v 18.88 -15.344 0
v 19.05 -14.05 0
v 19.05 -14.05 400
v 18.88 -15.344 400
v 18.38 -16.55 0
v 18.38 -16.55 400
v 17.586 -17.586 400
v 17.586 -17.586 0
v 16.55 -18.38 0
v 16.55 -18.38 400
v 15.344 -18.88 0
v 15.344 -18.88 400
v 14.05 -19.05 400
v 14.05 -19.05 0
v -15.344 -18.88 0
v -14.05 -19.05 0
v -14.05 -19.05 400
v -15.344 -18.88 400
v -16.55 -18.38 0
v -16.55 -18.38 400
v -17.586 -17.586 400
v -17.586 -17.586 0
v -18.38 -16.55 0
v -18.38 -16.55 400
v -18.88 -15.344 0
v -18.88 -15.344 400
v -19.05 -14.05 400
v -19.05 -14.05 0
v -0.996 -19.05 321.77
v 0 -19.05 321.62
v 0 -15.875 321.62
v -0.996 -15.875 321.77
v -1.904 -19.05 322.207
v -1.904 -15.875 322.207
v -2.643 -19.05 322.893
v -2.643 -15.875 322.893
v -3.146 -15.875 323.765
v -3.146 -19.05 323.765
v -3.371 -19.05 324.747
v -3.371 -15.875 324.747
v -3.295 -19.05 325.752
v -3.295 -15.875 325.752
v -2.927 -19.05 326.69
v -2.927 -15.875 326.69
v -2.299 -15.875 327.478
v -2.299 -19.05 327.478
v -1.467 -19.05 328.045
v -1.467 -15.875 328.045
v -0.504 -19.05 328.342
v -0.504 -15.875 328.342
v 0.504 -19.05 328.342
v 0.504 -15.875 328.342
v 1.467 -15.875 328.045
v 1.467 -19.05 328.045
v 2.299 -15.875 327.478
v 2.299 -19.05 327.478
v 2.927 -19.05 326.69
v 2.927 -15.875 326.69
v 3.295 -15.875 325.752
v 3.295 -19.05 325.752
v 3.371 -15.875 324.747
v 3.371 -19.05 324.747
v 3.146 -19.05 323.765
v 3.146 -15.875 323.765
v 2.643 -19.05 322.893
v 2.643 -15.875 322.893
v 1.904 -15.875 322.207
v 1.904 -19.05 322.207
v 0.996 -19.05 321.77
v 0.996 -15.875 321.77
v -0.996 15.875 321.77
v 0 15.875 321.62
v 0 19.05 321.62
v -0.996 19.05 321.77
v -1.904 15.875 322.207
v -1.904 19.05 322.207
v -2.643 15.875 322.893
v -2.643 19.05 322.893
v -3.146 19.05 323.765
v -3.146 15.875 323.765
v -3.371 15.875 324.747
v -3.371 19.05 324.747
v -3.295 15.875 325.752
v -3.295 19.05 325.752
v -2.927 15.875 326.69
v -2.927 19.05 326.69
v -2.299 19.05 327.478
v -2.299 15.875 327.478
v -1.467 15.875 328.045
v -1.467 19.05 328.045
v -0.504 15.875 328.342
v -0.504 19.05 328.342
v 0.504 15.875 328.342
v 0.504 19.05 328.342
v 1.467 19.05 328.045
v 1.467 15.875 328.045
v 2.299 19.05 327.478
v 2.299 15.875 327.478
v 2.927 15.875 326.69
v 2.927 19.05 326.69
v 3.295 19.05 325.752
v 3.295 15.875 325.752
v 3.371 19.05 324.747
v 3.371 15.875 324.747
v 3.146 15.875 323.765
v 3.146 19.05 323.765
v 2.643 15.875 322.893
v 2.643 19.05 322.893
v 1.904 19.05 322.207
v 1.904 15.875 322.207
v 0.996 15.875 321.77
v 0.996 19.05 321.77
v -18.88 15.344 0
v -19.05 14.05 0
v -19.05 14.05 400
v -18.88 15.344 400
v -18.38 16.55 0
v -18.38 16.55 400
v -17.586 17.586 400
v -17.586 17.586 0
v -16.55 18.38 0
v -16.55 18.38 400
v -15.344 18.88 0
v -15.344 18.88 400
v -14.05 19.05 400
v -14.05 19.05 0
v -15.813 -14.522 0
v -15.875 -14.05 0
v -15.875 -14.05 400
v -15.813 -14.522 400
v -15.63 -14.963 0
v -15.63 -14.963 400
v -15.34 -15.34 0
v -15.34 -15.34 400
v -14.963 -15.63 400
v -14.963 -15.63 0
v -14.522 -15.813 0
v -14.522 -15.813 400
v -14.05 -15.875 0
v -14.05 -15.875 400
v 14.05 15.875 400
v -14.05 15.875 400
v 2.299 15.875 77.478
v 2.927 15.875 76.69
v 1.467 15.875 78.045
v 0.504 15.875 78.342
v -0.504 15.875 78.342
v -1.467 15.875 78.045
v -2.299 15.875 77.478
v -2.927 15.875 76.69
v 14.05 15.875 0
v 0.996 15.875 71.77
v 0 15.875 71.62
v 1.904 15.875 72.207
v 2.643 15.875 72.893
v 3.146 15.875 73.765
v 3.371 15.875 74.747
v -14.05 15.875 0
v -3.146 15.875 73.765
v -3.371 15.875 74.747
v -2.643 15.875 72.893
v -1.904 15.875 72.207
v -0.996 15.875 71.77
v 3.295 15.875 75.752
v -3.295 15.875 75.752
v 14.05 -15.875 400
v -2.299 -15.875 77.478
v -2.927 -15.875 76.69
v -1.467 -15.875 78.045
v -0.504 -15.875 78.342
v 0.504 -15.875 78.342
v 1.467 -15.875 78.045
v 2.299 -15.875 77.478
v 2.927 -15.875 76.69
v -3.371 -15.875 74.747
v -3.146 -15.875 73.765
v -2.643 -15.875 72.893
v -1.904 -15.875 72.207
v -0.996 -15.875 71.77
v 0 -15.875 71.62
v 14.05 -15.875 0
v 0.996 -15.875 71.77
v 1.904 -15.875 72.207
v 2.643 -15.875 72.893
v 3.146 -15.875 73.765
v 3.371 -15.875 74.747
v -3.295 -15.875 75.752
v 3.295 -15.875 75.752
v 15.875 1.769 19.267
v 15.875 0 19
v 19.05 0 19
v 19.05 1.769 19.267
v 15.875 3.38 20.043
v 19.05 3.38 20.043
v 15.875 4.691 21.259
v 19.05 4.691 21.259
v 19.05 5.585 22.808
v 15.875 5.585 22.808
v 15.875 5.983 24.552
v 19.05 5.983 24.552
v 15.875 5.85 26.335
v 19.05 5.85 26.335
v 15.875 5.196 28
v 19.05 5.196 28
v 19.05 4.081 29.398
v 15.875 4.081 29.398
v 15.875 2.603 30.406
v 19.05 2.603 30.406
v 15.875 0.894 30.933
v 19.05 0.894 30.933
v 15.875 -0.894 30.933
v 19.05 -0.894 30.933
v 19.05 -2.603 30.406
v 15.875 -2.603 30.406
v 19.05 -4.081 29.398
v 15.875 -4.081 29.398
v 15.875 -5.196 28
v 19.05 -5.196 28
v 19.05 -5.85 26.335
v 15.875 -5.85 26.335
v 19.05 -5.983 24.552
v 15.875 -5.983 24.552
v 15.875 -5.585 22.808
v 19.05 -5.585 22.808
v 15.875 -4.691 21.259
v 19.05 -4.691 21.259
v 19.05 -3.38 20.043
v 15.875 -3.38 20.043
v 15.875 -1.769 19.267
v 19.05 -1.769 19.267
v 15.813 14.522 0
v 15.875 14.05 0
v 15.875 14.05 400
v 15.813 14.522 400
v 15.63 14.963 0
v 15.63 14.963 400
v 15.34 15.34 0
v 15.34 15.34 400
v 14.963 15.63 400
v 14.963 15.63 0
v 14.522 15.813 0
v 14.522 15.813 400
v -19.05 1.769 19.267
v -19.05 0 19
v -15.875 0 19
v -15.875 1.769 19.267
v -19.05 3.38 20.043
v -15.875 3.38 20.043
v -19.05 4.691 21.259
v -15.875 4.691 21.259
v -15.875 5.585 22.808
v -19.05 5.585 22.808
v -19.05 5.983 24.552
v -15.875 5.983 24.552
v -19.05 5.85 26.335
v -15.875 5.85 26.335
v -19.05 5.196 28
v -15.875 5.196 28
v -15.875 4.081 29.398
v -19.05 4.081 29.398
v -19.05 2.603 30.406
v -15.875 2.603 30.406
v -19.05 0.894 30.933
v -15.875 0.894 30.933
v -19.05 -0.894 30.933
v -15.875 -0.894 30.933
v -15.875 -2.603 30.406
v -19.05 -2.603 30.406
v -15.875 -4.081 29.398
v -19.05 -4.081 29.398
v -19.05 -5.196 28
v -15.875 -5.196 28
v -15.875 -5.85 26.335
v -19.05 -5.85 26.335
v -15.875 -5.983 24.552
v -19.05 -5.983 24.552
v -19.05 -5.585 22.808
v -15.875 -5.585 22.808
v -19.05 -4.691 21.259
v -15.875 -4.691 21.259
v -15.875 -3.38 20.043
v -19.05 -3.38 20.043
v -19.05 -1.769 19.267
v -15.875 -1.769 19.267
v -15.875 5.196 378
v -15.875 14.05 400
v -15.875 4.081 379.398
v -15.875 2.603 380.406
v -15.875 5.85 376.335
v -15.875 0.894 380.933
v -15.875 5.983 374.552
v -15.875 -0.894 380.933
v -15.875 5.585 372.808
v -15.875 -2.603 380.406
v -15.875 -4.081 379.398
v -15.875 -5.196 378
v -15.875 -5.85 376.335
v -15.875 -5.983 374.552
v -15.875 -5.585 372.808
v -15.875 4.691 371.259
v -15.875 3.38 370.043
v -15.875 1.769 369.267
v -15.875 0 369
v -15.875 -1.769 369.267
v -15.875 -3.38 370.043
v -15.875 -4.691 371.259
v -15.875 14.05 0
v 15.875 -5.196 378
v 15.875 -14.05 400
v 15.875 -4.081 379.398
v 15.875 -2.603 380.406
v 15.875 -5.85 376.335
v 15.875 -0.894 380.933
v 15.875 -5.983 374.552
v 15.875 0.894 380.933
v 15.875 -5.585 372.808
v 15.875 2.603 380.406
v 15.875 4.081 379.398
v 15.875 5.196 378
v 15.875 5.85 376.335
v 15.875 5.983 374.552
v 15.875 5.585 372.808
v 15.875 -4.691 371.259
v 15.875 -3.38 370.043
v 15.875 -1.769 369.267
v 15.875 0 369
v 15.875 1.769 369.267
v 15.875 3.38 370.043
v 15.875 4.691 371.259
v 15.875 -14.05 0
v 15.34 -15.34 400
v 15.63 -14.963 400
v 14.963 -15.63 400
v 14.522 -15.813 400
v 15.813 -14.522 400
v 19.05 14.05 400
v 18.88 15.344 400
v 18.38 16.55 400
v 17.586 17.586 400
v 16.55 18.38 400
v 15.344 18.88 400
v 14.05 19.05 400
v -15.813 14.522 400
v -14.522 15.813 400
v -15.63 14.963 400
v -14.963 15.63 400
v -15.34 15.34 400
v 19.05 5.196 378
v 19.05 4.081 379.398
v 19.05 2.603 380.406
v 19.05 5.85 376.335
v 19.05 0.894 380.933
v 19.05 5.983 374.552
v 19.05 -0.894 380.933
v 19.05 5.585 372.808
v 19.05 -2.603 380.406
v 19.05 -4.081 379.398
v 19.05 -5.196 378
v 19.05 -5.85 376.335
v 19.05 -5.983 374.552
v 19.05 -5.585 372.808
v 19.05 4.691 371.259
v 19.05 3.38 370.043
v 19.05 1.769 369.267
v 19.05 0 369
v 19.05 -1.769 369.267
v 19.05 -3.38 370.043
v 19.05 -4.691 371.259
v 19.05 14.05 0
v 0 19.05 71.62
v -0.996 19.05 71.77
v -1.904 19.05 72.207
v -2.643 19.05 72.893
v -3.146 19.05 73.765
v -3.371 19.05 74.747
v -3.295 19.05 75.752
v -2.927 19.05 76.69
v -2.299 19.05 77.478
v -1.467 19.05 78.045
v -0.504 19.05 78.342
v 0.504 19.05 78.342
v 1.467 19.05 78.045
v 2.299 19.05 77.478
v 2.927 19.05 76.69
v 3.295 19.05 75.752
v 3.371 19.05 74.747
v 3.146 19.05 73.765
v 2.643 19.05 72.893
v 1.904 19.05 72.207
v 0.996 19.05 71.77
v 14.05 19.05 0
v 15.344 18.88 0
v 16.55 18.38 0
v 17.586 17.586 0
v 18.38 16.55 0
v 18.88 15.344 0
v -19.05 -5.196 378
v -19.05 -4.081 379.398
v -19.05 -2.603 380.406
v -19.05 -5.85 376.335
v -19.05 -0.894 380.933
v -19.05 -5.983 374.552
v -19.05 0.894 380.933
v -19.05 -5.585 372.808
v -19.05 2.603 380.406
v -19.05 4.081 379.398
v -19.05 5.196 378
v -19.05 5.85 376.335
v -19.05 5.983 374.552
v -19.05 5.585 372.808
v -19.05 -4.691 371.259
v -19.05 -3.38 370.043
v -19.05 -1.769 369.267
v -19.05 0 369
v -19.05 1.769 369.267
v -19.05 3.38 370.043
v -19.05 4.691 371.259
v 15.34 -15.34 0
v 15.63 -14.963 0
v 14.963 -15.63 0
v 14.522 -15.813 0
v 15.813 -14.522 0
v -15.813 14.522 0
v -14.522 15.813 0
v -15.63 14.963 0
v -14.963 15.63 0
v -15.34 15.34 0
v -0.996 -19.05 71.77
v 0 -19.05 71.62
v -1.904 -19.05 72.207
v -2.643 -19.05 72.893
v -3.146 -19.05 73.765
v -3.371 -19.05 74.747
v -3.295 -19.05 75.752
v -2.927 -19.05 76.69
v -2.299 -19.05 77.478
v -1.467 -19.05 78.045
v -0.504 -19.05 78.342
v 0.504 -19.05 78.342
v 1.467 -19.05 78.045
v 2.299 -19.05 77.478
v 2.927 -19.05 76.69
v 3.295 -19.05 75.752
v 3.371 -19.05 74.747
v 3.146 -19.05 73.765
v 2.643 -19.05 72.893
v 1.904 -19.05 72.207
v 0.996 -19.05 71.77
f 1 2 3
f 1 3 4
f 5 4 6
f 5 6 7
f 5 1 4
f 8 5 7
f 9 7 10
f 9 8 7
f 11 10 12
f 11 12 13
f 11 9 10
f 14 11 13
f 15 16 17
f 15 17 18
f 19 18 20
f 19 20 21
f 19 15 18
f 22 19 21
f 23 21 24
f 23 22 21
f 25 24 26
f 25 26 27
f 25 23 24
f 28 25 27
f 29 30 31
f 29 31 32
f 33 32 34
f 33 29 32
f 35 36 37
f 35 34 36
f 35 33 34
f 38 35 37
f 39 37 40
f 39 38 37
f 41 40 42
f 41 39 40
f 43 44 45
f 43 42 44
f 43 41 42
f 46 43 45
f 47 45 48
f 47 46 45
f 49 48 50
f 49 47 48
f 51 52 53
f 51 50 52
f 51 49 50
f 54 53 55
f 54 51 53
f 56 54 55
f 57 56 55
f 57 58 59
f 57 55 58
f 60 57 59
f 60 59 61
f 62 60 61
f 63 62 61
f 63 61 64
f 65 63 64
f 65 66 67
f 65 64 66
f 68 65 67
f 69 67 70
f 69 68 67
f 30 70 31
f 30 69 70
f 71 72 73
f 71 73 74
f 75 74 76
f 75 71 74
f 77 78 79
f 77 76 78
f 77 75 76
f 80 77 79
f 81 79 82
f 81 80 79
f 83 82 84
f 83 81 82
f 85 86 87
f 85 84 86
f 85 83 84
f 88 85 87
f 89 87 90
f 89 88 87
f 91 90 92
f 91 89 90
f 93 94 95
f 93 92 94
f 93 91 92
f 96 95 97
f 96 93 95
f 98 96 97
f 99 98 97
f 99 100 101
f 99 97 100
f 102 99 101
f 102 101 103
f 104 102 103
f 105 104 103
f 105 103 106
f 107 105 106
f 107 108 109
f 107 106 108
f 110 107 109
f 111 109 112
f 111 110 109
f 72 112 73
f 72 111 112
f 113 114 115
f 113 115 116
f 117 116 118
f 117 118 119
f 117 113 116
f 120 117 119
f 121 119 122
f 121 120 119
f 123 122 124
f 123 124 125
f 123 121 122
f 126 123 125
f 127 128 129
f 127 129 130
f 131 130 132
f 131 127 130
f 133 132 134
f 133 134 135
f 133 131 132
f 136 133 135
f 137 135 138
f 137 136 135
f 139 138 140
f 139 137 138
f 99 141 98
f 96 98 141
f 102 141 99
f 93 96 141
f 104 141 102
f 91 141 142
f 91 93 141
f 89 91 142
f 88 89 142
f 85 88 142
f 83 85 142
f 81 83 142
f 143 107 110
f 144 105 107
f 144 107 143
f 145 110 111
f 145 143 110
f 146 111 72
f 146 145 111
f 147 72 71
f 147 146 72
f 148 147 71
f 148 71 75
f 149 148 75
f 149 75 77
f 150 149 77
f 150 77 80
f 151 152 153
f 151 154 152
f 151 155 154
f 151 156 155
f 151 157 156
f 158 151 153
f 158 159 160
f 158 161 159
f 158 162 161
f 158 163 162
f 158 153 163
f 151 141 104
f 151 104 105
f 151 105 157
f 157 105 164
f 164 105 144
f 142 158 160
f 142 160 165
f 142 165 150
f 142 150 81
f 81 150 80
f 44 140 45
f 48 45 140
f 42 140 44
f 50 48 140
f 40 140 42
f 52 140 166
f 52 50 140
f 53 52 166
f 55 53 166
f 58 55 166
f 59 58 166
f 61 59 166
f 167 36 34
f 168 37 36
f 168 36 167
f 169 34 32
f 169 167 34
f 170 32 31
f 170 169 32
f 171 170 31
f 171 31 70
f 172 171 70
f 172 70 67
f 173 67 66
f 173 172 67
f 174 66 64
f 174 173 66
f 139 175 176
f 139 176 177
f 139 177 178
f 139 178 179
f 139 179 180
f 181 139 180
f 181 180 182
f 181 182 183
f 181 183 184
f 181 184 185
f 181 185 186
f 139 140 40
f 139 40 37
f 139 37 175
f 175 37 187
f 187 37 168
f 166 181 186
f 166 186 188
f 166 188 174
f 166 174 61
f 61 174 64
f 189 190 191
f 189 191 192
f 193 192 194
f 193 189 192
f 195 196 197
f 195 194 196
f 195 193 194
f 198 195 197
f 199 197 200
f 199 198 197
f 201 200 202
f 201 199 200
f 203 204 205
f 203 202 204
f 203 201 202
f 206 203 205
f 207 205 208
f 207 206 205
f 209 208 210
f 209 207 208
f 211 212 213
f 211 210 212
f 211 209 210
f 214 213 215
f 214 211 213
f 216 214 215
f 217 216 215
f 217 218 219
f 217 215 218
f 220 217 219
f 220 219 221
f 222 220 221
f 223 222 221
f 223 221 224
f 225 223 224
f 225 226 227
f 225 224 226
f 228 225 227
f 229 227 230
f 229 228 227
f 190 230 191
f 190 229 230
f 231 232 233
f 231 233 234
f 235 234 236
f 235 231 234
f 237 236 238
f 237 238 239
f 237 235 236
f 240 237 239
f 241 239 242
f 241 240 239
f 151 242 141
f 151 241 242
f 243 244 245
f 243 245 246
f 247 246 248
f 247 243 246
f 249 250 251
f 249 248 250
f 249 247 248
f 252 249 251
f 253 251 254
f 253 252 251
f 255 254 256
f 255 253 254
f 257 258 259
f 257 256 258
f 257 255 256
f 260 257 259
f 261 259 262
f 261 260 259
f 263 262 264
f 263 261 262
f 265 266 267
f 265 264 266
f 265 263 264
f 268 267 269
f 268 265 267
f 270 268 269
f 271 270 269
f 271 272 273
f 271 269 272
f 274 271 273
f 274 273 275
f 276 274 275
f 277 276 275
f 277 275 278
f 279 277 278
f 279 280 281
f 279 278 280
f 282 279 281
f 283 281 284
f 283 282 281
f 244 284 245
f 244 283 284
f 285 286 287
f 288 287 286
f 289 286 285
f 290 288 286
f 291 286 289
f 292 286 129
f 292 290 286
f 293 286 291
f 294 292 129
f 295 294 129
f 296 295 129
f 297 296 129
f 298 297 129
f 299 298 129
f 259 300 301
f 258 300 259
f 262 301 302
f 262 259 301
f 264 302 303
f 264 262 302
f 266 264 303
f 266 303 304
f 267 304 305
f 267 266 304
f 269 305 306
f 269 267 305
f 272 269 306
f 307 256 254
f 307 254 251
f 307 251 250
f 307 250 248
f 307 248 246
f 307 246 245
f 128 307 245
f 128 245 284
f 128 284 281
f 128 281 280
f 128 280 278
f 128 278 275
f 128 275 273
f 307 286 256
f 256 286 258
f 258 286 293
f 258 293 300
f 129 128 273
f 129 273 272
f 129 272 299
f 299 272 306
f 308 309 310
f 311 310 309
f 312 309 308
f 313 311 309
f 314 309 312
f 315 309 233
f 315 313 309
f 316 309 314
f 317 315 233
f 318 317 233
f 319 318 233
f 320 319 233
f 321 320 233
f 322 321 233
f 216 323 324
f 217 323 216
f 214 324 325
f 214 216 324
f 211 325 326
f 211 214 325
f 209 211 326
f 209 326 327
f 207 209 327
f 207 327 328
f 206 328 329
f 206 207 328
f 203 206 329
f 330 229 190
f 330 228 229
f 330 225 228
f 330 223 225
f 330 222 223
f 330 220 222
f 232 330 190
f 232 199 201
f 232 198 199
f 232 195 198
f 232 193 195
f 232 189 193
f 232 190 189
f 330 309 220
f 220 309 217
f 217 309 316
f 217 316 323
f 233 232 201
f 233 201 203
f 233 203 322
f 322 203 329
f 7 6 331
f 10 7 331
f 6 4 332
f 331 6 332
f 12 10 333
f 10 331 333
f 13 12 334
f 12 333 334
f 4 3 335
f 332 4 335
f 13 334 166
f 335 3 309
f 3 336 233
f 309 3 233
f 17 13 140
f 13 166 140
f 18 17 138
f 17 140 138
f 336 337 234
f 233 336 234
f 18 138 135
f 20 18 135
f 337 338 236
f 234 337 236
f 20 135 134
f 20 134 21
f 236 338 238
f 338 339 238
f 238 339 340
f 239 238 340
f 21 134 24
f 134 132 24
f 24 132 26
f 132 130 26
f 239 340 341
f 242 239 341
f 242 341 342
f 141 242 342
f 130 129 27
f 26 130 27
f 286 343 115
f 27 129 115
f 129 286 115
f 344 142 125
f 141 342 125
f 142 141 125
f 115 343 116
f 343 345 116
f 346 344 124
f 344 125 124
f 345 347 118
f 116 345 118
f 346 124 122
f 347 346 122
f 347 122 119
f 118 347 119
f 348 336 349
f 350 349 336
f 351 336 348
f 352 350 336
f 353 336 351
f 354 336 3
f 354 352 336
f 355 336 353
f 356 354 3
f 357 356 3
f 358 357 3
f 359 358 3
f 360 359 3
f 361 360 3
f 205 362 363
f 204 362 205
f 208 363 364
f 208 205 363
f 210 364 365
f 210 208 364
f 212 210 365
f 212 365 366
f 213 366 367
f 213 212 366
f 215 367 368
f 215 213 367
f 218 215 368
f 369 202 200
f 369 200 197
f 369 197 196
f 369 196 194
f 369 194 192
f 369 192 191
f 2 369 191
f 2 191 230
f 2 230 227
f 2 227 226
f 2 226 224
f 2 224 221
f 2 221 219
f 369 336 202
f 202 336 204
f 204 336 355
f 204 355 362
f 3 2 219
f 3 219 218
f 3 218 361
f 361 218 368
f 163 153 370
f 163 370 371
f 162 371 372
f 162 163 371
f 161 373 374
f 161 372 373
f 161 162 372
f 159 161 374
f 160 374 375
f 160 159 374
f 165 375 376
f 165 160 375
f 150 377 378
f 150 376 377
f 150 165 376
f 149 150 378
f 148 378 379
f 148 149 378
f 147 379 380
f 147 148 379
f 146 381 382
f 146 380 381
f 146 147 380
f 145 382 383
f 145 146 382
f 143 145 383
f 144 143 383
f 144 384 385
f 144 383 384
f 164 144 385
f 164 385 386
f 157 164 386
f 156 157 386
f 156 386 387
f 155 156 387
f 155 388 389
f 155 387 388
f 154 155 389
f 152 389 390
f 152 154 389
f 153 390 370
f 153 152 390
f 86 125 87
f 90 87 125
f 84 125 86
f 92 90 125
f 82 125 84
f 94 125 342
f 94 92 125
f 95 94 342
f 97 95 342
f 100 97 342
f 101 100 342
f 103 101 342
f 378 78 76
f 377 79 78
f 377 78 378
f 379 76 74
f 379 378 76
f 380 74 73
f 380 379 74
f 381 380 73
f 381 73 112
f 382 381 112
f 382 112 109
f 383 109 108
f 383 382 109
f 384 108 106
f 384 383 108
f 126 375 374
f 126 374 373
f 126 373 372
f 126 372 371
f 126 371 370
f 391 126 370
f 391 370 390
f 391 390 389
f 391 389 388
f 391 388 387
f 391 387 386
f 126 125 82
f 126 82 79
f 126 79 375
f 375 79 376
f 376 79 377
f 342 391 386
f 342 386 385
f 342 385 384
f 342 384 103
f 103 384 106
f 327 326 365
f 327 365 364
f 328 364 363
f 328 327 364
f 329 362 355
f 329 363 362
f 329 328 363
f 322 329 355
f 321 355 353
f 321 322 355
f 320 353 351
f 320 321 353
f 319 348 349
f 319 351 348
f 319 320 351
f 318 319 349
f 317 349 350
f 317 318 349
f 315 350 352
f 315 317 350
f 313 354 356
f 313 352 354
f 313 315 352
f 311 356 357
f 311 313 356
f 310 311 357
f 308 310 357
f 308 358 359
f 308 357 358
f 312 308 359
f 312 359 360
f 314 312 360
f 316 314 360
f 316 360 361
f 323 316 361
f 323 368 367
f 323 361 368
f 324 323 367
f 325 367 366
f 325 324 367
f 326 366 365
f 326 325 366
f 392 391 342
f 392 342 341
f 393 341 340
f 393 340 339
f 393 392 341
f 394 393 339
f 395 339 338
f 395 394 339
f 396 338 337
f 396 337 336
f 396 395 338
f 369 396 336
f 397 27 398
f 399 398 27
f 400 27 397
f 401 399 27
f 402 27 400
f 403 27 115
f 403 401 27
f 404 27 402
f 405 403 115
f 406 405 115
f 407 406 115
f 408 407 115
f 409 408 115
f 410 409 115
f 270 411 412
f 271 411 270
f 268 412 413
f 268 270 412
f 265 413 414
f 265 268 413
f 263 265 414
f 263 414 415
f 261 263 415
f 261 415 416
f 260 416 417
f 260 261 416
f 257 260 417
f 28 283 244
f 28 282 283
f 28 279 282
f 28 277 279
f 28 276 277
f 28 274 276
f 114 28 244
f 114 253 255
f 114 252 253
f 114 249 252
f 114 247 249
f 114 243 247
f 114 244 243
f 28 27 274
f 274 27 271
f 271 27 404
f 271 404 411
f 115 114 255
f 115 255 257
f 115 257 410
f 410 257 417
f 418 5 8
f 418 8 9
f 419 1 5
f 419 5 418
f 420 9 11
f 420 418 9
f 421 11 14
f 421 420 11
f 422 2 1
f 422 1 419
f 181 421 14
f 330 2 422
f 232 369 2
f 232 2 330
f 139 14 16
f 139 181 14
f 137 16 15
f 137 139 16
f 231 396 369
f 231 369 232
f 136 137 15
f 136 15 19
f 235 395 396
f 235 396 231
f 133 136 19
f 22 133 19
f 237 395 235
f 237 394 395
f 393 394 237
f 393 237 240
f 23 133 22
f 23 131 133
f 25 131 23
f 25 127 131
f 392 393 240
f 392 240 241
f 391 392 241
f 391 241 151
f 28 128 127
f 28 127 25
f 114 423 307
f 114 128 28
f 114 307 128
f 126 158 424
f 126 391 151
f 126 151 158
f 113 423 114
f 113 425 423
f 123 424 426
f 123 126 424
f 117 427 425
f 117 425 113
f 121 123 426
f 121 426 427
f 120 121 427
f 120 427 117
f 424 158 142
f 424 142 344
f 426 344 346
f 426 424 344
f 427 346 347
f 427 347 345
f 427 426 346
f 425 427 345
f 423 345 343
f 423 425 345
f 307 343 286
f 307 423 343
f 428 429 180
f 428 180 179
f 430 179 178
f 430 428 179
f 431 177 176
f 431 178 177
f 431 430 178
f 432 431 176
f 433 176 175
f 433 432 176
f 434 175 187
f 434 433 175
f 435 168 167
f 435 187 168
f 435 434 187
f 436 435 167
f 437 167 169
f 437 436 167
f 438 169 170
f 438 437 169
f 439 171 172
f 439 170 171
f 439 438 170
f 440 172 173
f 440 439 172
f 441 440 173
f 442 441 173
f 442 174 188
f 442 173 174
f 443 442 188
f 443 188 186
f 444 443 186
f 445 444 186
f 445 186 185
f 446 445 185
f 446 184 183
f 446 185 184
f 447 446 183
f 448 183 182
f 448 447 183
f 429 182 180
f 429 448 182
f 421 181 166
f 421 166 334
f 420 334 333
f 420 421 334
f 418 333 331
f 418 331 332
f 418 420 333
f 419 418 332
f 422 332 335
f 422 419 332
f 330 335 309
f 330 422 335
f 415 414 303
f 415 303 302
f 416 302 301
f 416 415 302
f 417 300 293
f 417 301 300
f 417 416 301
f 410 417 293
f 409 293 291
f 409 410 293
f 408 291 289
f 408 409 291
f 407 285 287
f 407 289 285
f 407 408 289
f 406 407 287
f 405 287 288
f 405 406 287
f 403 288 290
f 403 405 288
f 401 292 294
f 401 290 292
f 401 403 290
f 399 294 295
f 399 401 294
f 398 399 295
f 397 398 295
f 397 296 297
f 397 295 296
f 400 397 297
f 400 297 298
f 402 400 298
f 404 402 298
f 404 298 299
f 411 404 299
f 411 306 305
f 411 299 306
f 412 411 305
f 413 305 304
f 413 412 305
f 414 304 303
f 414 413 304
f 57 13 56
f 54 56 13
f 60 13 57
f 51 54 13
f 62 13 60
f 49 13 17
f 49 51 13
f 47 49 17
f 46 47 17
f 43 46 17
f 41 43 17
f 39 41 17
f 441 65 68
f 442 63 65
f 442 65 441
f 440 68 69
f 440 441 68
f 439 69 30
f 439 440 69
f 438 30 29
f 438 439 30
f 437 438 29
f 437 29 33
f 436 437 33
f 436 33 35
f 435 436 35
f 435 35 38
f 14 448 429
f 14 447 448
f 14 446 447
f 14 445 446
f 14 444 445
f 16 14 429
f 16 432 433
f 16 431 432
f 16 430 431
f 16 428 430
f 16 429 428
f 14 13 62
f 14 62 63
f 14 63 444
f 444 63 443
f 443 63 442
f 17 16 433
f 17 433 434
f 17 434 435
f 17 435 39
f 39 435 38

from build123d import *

# Parameters (mm, degrees)
BOSS_EXTRUDE1_DEPTH     = 400
CUT_EXTRUDE1_DEPTH      = 401.906229685
CUT_EXTRUDE1_DEPTH_BACK = 401.906229685
SKETCH2_R               = 6
CUT_EXTRUDE2_DEPTH      = 401.906229685
CUT_EXTRUDE2_DEPTH_BACK = 401.906229685
SKETCH3_R               = 3.38


with BuildPart() as part:
    # Sketch1 → Boss-Extrude1 (new body)
    with BuildSketch(Plane.XY):
        with BuildLine():
            Line((-14.05, 19.05), (14.05, 19.05))
            ThreePointArc((14.05, 19.05), (17.585533906, 17.585533906), (19.05, 14.05))
            Line((19.05, 14.05), (19.05, -14.05))
            ThreePointArc((19.05, -14.05), (17.585533906, -17.585533906), (14.05, -19.05))
            Line((14.05, -19.05), (-14.05, -19.05))
            ThreePointArc((-14.05, -19.05), (-17.585533906, -17.585533906), (-19.05, -14.05))
            Line((-19.05, -14.05), (-19.05, 14.05))
            ThreePointArc((-19.05, 14.05), (-17.585533906, 17.585533906), (-14.05, 19.05))
        make_face()
        with BuildLine():
            Line((-15.875, 14.05), (-15.875, -14.05))
            ThreePointArc((-15.875, -14.05), (-15.340469876, -15.340469876), (-14.05, -15.875))
            Line((-14.05, -15.875), (14.05, -15.875))
            ThreePointArc((14.05, -15.875), (15.340469876, -15.340469876), (15.875, -14.05))
            Line((15.875, -14.05), (15.875, 14.05))
            ThreePointArc((15.875, 14.05), (15.340469876, 15.340469876), (14.05, 15.875))
            Line((14.05, 15.875), (-14.05, 15.875))
            ThreePointArc((-14.05, 15.875), (-15.340469876, 15.340469876), (-15.875, 14.05))
        make_face(mode=Mode.SUBTRACT)
    extrude(amount=BOSS_EXTRUDE1_DEPTH)

    # Sketch2 → Cut-Extrude1 (cut, two sides: drawn at the far end of the back side and taken through both)
    with BuildSketch(Plane(origin=(0, 0, 0), x_dir=(0, 0, -1), z_dir=(1, 0, 0)).offset(-CUT_EXTRUDE1_DEPTH_BACK)):
        with Locations((-375, 0)):
            Circle(SKETCH2_R)
        with Locations((-25, 0)):
            Circle(SKETCH2_R)
    extrude(amount=CUT_EXTRUDE1_DEPTH + CUT_EXTRUDE1_DEPTH_BACK, mode=Mode.SUBTRACT)

    # Sketch3 → Cut-Extrude2 (cut, two sides: drawn at the far end of the back side and taken through both)
    with BuildSketch(Plane(origin=(0, 0, 0), x_dir=(1, 0, 0), z_dir=(0, 1, 0)).offset(-CUT_EXTRUDE2_DEPTH_BACK)):
        with Locations(Location((0, -325, 0), (0, 0, 90))):
            Circle(SKETCH3_R)
        with Locations(Location((0, -75, 0), (0, 0, 90))):
            Circle(SKETCH3_R)
    extrude(amount=CUT_EXTRUDE2_DEPTH + CUT_EXTRUDE2_DEPTH_BACK, mode=Mode.SUBTRACT)


solid = part.part
